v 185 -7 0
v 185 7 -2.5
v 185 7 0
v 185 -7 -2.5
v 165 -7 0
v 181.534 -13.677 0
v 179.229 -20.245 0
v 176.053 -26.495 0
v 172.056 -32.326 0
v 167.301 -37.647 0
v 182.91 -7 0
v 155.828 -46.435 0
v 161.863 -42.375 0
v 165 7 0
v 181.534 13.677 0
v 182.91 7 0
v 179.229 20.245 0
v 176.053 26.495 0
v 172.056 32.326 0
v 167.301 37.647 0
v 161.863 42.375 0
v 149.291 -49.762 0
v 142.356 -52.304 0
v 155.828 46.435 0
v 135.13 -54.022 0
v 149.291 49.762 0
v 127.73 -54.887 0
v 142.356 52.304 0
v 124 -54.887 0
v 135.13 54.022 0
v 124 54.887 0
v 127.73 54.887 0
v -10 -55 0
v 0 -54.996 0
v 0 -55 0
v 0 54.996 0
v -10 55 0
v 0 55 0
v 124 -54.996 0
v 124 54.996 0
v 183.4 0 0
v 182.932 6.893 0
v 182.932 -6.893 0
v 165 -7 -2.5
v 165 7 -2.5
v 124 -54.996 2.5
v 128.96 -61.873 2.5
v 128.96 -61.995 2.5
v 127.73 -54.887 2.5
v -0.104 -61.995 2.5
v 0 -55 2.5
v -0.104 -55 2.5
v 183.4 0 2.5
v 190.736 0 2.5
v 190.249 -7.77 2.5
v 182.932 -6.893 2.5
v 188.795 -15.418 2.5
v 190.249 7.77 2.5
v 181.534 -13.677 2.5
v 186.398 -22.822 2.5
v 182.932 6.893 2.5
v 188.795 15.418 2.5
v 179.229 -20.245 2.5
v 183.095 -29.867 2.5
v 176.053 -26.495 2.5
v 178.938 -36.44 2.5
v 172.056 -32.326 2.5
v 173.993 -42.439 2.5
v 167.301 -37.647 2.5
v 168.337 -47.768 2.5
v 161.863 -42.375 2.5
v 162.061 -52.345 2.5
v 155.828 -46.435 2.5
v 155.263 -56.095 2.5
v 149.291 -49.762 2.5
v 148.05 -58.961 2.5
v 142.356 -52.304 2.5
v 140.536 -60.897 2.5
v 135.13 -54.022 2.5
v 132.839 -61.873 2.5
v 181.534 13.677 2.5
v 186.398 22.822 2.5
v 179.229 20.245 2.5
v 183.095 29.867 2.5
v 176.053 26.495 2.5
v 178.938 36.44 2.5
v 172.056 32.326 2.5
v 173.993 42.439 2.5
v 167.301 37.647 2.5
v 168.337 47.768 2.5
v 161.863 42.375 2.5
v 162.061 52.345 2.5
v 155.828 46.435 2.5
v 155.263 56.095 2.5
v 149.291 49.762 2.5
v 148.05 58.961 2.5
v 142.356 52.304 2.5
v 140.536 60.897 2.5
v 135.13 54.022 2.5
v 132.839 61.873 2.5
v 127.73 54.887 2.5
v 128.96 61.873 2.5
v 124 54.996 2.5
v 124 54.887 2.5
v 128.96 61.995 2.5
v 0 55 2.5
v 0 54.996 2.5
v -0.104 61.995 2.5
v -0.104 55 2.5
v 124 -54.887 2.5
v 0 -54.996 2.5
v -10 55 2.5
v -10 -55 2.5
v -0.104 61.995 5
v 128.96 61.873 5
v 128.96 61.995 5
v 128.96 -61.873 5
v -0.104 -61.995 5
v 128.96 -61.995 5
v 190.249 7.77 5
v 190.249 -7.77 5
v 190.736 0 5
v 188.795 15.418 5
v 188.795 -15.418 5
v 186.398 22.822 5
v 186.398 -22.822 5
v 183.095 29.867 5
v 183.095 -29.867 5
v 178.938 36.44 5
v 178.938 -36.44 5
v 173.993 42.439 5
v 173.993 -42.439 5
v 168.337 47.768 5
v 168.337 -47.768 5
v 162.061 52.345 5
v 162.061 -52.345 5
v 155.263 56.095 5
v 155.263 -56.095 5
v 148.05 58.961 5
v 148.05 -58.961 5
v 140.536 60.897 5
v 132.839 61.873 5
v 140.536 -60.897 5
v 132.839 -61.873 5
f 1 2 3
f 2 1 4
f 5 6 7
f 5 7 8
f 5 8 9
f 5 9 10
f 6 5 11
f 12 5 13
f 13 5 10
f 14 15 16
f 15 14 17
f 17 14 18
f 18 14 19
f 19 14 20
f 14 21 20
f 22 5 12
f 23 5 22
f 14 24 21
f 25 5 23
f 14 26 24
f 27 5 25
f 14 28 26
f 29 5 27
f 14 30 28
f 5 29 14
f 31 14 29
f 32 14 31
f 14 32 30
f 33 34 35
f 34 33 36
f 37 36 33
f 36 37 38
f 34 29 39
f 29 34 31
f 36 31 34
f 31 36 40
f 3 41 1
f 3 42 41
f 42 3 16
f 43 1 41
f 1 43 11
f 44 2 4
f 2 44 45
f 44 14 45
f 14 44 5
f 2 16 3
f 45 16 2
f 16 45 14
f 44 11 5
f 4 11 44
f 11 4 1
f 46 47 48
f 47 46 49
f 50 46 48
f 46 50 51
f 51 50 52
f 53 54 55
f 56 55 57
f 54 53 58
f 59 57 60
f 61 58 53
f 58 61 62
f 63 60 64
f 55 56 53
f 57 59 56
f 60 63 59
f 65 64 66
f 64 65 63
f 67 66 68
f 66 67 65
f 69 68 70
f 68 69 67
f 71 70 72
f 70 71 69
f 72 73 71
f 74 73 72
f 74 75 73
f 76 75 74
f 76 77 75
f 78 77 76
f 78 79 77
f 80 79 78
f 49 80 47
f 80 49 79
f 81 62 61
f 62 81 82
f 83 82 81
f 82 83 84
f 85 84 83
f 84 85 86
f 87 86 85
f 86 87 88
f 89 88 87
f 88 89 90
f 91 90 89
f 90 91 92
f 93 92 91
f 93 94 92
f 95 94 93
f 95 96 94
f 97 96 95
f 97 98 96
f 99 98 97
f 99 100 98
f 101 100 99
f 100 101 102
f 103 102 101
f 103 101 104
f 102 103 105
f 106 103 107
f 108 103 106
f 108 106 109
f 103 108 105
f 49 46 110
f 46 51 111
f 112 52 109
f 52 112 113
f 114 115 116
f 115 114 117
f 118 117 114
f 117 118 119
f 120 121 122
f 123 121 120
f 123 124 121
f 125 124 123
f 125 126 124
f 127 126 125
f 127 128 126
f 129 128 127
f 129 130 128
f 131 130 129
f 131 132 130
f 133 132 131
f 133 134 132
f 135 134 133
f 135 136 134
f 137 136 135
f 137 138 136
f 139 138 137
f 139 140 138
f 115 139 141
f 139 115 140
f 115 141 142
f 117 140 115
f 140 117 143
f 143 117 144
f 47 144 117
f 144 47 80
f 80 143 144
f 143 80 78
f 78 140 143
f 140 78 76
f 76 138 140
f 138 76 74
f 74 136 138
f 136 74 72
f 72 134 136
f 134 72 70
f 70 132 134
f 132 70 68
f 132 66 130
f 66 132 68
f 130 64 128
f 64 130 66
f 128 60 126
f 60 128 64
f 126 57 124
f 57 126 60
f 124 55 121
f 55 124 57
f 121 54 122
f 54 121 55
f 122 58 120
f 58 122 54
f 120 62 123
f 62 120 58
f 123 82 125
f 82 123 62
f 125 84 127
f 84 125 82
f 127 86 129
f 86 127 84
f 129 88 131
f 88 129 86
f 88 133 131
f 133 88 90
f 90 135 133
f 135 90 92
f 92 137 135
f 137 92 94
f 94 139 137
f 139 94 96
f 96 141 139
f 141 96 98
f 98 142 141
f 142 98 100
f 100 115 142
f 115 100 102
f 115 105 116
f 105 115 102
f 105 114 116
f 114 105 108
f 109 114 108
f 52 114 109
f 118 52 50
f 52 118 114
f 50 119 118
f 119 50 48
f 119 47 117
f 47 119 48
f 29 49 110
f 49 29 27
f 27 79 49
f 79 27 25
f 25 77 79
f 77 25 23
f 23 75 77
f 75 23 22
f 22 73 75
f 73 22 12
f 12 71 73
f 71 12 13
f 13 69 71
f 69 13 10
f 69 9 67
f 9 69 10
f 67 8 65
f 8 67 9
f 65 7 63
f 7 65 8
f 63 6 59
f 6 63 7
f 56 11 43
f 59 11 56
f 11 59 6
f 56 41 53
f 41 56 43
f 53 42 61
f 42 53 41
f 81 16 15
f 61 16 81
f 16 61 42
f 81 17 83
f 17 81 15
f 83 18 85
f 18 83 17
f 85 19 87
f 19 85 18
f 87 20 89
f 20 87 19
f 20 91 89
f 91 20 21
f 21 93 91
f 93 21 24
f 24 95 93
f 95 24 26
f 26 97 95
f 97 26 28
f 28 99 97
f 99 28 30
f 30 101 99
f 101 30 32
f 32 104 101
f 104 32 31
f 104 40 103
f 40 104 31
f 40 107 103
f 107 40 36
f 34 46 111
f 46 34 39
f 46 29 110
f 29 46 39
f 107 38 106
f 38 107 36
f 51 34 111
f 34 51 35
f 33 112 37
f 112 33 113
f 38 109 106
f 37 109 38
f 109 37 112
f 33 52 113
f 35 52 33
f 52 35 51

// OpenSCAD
// file: boat-top-back.scad
depth = 74;
boat_width = 110;
oversize = 7;
thickness = 2.8;
pipe_distance = 10;
pipe_d = 5.75;
screw_d = 3.5;
lock_side_offset = 5;
overisze_front = 30;

size = 4;
lock_width = 12;
lock_length = 5;

camlock_d=12;

big_eps = 0.5;

$fn=50;

//rotate([0,180,0])
translate([0,0,4])
back_cover_base();

module back_cover_base(){
    difference() {
        union(){
            translate([0,0,-thickness/2])cube([depth,boat_width,thickness],center=true);
            color("#a88132")translate([oversize/2,0,thickness/2])cube([depth+oversize,boat_width+2*oversize,thickness],center=true);
            color("green")translate([-depth/2-overisze_front,-boat_width/2-oversize,0])cube([overisze_front,boat_width+2*oversize,thickness]);
            color("blue")translate([-depth/2-2/3*overisze_front,-30/2,-thickness])cube([2/3*overisze_front,30,thickness]);
        }
        translate([-depth/2-15,+pipe_distance/2,0]) rotate([0,0,0]) cylinder(h=thickness*10,d=pipe_d, center=true);
        translate([-depth/2-15,-pipe_distance/2,0]) rotate([0,0,0]) cylinder(h=thickness*10,d=pipe_d, center=true);
        
        translate([-depth/2+8,+(boat_width/2-camlock_d/2-1),0]) rotate([0,0,0]) cylinder(h=thickness*10,d=camlock_d, center=true);
        translate([-depth/2+8,-(boat_width/2-camlock_d/2-1),0]) rotate([0,0,0]) cylinder(h=thickness*10,d=camlock_d, center=true);
        /*
        translate([0,-boat_width/2+lock_side_offset,-thickness-size/2])
            color("red")lock_hole();
        translate([0,-(-boat_width/2+lock_side_offset),-thickness-size/2])
            lock_hole();
        */
    }
}

/*
module lock(){
        translate([0,lock_length+size,0]) rotate([0,90,0])
                cylinder(h=lock_width+size, d=size-big_eps, center=true);
        length = lock_length+lock_side_offset+10;
        translate([0,-length/2+lock_length+size,0])
            difference() {
                cube([lock_width-size-big_eps, length, size-big_eps], center=true);
                translate([0,-length/2-size+1,-size]) rotate([20,0,0])
                        cube(10, center=true);
                lock_hole();
            }
}

module lock_hole(){
        cylinder(h=thickness*10,d=screw_d, center=true);
}

module lock_holder(){
        translate([lock_width/2,lock_length,0])cube(size, center=true);
        translate([-lock_width/2,lock_length,0])cube(size, center=true);
        translate([0,2*size+lock_length,0])cube([lock_width+size,size,size], center=true);
}
*/
// main file
use <boat.scad>;

depth = 74;
boat_width = 110;
oversize = 7;
thickness = 2.5;
pipe_distance = 10;
pipe_d = 5.75;
screw_d = 3.5;
lock_side_offset = 5;

size = 4;
lock_width = 12;
lock_length = 5;

camlock_d=12;

big_eps = 0.5;

$fn=50;

d = 12;

translate([0,0,thickness]) oversized_top();
linear_extrude(thickness) 2d_front();
intersection(){
    translate([175,0,-thickness/2]) cube([20,oversize*2,thickness], center=true);
    translate([0,0,-thickness]) oversized_top();
}
translate([-5,0,thickness/2])cube([10, boat_width, thickness], center=true);

module oversized_top(){
    linear_extrude(thickness) scale([(175+oversize)/175, (boat_width+2*oversize)/boat_width, 1]) 2d_front();
}

module 2d_front(){
    translate([-depth,0,-1]){
        projection(){
            difference(){
                scale([9.9,9.166,10]){
                    difference(){
                        union(){
                            translate([20,0,0])cylinder(20,d=d);
                            translate([30/2-d+2,0,0])cube([30,d,30], center=true);
                        }
                        translate([-30,-15,-15.5])cube([30,31,31]);
                    }
                }
                translate([depth/2-0.1,0,-thickness/2])cube([depth,boat_width*2,310],center=true);
            }
        }
    }
}
